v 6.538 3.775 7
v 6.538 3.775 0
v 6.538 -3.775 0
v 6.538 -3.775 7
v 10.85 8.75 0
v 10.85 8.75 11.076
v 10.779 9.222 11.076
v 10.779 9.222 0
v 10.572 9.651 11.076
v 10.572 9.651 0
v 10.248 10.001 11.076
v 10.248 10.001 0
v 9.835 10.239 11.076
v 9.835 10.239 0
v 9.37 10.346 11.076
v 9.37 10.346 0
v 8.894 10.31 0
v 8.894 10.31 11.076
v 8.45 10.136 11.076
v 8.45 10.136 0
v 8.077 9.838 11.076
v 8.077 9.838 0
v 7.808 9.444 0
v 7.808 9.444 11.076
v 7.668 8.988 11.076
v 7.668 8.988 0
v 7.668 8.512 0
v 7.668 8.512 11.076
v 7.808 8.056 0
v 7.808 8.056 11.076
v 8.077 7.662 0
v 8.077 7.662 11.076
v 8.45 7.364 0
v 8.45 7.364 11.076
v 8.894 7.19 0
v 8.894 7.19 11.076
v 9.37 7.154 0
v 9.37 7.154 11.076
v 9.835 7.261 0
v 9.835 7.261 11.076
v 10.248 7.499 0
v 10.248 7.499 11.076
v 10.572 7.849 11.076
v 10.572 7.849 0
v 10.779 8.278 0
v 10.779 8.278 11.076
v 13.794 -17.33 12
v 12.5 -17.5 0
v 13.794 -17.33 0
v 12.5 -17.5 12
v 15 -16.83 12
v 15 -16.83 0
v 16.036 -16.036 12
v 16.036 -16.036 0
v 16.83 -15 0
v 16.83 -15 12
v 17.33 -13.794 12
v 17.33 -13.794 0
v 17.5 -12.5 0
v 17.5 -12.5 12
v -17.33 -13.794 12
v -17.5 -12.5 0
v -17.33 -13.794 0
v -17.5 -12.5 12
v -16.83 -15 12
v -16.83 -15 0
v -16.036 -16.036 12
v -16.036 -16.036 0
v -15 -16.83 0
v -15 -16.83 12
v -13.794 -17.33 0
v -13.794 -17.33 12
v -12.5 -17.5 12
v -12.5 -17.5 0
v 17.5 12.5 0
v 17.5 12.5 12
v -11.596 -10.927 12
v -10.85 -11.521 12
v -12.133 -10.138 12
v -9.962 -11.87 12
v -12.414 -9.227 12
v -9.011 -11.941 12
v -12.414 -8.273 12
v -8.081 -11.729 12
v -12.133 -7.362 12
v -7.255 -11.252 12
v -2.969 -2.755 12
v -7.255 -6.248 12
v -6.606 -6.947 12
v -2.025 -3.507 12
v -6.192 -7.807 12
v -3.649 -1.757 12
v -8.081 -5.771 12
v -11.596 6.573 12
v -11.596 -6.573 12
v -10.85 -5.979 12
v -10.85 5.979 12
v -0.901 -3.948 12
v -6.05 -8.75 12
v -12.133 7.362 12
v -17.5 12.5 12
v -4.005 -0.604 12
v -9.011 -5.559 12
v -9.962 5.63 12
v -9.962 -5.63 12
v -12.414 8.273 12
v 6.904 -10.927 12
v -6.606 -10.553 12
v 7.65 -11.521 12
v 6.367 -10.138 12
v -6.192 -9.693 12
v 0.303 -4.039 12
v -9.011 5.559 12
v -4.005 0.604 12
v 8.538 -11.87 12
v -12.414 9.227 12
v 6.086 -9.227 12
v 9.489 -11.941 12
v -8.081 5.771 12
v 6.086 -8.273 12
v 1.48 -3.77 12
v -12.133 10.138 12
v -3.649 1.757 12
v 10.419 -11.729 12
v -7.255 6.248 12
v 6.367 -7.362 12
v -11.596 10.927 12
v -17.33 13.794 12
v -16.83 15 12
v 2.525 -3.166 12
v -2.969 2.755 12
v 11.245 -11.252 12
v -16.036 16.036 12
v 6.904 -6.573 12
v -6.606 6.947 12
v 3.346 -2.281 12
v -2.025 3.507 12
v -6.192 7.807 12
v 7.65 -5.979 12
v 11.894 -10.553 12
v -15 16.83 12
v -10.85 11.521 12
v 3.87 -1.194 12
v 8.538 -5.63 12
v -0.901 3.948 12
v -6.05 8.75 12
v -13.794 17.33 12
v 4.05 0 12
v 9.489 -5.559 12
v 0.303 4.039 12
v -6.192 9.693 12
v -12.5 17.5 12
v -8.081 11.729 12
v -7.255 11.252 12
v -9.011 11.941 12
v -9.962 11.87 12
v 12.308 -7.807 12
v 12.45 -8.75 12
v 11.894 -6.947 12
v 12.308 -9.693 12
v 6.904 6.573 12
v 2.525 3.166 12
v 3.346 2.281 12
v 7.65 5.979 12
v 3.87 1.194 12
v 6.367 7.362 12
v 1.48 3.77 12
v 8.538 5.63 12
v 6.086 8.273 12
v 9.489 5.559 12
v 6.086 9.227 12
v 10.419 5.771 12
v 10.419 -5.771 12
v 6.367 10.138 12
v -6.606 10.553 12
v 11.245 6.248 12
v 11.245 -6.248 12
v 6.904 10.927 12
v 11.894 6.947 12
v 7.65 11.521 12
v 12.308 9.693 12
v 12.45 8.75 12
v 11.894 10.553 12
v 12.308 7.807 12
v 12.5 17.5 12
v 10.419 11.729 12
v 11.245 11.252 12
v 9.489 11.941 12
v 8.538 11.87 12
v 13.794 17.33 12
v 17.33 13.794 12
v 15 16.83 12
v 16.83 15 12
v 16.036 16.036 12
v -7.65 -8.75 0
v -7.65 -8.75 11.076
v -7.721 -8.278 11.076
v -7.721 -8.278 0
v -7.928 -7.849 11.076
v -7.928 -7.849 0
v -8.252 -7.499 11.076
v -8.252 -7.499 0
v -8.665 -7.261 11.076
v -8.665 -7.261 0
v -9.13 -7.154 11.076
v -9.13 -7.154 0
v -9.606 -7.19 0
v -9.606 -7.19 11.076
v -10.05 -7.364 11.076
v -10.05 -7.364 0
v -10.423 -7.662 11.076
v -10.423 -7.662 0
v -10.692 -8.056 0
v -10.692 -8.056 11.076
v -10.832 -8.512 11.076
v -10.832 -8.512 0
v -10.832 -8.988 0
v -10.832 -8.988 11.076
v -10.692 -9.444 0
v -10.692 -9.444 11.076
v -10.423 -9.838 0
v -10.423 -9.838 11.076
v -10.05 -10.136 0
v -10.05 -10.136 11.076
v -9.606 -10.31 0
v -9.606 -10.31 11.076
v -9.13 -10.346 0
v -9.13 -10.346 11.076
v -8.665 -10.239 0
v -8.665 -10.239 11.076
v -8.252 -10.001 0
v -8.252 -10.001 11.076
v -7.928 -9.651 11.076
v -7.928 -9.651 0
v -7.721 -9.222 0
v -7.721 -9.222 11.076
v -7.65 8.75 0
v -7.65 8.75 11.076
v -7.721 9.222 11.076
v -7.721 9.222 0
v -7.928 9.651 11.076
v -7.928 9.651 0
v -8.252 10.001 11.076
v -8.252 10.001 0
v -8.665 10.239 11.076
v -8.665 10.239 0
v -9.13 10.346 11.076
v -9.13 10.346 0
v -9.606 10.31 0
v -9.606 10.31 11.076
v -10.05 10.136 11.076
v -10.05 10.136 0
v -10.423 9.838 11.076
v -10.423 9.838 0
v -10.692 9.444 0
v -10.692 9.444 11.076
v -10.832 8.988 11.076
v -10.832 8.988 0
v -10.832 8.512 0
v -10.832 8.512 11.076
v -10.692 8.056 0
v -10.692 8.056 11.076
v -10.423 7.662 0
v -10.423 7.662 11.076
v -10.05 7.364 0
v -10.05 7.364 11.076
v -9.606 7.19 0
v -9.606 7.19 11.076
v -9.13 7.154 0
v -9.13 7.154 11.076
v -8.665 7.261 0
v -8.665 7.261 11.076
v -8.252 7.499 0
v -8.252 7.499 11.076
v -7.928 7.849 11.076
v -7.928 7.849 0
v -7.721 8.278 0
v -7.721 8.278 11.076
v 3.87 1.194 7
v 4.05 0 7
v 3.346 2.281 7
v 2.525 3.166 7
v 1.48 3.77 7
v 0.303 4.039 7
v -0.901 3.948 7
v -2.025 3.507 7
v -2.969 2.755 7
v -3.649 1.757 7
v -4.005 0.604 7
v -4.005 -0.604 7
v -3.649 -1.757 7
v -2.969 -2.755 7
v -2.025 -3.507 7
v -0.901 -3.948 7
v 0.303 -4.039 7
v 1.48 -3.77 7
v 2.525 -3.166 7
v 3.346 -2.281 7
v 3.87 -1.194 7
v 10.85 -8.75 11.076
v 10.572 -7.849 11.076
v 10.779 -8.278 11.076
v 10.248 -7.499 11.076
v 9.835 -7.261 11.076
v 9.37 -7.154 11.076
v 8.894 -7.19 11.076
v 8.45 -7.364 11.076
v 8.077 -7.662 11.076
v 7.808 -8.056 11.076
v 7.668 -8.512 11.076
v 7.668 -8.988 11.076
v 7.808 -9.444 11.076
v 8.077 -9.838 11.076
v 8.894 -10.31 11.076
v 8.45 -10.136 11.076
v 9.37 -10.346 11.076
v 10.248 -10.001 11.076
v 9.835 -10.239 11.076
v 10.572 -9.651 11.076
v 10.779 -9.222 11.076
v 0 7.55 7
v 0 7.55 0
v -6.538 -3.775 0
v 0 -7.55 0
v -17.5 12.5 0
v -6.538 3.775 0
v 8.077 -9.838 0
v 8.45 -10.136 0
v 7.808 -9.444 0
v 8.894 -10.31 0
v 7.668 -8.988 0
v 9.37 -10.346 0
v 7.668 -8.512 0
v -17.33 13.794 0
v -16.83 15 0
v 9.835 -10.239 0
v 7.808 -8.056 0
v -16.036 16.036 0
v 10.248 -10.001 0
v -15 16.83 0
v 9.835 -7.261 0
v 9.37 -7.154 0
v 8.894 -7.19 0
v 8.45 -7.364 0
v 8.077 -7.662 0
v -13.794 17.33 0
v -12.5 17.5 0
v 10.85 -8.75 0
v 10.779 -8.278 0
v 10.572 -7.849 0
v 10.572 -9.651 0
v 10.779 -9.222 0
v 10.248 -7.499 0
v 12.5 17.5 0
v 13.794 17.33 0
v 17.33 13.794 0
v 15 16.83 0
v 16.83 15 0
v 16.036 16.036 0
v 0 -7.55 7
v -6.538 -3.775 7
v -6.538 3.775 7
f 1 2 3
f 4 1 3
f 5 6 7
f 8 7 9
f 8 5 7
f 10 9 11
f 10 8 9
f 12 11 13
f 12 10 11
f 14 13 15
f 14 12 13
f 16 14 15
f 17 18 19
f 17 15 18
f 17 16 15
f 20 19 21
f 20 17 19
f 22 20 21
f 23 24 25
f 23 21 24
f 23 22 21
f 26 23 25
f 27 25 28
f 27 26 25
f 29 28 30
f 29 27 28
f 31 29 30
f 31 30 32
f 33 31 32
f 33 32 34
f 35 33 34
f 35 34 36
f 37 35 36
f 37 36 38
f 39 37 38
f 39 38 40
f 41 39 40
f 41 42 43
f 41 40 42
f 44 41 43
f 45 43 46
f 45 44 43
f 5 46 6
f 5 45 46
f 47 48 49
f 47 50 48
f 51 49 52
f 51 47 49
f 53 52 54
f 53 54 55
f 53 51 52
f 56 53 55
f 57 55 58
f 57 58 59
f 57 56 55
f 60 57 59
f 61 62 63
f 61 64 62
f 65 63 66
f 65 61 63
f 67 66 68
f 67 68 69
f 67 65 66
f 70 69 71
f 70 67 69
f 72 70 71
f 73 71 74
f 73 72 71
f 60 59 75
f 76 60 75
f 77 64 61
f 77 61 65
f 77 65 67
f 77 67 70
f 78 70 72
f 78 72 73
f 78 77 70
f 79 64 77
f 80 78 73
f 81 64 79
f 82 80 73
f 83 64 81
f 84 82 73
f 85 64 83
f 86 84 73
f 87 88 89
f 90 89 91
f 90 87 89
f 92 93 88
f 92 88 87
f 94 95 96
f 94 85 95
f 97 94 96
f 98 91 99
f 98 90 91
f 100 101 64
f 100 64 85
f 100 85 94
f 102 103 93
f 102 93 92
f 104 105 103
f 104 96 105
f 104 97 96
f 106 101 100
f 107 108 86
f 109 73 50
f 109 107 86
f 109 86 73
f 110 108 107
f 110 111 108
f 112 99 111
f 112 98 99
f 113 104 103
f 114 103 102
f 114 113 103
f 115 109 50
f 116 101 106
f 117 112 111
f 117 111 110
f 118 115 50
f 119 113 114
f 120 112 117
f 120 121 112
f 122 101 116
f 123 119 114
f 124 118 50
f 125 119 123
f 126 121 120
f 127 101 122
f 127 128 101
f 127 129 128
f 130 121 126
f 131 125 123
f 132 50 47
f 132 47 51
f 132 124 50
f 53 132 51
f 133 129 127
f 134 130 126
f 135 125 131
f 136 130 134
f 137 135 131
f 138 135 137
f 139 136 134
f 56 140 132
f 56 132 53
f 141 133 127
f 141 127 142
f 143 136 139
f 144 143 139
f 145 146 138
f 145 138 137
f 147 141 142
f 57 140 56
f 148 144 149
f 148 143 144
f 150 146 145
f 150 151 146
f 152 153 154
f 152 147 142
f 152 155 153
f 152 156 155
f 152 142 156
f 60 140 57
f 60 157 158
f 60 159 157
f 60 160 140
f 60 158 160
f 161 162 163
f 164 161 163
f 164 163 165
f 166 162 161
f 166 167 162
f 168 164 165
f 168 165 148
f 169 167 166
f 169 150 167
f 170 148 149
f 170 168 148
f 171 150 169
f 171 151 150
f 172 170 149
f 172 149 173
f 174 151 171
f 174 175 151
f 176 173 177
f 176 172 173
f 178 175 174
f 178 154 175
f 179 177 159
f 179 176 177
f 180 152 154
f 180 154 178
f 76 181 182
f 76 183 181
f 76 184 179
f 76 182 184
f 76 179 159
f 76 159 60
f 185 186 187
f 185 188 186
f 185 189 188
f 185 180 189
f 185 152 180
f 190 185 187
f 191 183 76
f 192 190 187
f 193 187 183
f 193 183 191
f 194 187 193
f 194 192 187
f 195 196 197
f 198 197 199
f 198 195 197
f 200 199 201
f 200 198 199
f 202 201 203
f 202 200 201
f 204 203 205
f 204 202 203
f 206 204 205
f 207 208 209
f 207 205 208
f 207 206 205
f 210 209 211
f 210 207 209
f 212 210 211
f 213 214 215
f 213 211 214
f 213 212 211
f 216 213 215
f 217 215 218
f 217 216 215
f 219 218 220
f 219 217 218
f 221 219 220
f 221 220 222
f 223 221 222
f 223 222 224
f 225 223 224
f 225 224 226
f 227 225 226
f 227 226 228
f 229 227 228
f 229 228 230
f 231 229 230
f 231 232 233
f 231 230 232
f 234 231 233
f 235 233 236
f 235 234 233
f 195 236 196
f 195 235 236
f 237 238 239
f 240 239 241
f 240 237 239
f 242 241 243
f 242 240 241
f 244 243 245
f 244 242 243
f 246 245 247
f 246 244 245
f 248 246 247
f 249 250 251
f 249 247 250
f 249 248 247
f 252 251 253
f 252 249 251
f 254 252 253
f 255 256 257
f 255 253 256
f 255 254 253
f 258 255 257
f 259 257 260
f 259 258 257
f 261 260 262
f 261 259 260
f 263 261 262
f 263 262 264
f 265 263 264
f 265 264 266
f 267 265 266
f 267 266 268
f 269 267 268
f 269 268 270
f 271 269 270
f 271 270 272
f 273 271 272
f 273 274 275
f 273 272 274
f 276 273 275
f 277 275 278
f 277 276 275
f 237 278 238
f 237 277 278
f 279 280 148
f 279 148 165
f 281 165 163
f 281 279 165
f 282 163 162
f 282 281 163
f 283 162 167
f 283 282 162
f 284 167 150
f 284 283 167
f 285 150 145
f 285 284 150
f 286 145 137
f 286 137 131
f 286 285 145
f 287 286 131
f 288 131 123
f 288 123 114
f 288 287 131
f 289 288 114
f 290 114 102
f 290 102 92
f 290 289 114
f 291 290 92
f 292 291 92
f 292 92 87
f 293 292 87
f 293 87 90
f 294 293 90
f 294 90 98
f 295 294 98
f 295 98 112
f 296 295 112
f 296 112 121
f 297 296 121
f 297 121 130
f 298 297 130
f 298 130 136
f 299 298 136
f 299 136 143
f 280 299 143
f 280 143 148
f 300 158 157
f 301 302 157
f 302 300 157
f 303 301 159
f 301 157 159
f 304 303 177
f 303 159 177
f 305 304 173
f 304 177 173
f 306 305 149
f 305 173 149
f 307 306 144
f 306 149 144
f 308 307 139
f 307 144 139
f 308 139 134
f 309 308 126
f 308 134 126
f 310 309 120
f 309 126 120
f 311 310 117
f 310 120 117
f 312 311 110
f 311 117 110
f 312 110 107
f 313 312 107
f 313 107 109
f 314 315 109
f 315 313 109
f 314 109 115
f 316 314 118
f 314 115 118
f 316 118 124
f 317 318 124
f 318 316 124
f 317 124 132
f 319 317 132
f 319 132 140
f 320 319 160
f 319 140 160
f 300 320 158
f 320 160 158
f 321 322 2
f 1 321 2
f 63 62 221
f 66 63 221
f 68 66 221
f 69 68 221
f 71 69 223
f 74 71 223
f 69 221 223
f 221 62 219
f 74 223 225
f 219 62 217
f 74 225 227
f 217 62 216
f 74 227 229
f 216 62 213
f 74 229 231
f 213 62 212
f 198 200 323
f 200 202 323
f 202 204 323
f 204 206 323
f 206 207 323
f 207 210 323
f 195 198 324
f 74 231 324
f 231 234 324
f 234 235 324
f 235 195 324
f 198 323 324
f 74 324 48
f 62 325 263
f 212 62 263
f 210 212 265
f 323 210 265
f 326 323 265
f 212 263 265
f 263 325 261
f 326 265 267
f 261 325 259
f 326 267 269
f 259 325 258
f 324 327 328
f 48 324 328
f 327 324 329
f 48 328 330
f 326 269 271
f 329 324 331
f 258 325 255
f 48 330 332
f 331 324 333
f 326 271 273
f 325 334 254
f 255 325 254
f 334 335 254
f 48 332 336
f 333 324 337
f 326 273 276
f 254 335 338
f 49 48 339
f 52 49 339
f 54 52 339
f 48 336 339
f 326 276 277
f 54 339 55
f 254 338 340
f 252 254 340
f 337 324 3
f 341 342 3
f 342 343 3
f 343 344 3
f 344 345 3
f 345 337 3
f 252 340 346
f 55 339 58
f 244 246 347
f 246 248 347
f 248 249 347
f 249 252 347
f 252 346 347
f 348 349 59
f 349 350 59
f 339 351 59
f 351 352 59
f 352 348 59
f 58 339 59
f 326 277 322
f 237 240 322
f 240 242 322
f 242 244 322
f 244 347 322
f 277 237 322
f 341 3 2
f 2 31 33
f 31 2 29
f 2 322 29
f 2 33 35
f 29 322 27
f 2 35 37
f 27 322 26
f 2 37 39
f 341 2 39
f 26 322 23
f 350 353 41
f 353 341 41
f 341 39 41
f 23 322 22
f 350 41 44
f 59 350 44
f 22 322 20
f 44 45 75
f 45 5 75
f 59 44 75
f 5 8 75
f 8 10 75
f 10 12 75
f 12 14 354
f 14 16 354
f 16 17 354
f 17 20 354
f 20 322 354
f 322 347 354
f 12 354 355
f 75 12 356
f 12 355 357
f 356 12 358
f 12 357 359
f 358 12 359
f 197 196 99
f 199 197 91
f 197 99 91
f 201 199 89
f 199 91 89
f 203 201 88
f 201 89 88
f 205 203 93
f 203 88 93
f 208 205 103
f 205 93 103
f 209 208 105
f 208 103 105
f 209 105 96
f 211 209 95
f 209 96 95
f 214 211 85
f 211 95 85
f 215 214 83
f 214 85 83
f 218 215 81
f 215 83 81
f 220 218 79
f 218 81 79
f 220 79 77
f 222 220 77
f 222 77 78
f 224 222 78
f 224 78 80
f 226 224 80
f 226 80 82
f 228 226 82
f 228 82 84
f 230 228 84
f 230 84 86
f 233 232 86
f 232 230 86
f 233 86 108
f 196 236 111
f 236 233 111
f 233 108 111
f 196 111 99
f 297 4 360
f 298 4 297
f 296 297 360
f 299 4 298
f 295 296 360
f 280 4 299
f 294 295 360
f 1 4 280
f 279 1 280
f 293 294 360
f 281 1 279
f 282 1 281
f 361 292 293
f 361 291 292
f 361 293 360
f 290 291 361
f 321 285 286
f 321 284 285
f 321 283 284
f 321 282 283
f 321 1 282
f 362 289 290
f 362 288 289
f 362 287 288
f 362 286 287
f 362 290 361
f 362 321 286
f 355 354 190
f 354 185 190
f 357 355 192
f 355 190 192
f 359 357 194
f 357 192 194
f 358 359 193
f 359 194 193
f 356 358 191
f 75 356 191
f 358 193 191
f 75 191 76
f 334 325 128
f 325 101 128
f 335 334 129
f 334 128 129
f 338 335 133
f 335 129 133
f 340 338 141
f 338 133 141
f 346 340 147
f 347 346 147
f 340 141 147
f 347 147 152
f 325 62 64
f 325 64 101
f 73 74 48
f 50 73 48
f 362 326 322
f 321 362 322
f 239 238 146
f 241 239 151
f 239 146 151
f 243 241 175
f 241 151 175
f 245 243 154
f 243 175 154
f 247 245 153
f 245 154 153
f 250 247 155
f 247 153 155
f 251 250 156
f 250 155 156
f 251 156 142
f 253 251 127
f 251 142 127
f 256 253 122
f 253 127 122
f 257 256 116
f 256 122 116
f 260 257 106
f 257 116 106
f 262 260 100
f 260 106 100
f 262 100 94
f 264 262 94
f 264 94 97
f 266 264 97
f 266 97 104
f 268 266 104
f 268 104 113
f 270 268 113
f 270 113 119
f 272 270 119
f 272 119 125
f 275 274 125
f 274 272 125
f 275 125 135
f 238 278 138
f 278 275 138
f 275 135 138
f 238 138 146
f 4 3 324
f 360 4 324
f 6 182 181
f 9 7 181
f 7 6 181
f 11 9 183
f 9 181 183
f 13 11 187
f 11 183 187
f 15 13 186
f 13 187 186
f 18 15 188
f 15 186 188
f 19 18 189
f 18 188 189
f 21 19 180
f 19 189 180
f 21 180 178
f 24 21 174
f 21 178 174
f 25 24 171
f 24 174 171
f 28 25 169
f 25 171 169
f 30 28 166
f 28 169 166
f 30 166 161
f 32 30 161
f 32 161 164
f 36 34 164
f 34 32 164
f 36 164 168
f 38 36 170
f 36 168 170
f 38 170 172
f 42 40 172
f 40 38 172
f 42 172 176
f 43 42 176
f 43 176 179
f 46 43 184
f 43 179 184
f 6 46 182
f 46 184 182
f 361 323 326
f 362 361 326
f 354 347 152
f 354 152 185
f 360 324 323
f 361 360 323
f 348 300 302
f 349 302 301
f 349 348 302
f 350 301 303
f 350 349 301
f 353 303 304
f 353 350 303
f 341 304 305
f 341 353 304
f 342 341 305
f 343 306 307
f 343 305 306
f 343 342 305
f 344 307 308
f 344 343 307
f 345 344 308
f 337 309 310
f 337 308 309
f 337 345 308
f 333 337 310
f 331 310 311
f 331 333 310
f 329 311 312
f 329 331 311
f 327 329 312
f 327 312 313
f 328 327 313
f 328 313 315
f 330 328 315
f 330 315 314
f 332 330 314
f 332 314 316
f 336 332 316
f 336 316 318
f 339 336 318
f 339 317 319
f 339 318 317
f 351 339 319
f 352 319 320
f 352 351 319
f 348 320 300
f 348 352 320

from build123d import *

# Parameters (mm, degrees)
SKETCH1_W                    = 35
SKETCH1_H                    = 35
SKETCH1_R                    = 4.05
SKETCH1_R_2                  = 1.6
BOSS_EXTRUDE1_DEPTH          = 12
FILLET1_R                    = 5
SKETCH5_R                    = 3.2
CUT_EXTRUDE1_DEPTH           = 1
CUT_EXTRUDE1_DRAFT           = -60
CUT_EXTRUDE1_PROFILE_2_DEPTH = 1
CUT_EXTRUDE1_PROFILE_2_DRAFT = -60
CUT_EXTRUDE1_PROFILE_3_DEPTH = 1
CUT_EXTRUDE1_PROFILE_3_DRAFT = -60
CUT_EXTRUDE1_PROFILE_4_DEPTH = 1
CUT_EXTRUDE1_PROFILE_4_DRAFT = -60
CUT_EXTRUDE2_DEPTH           = 7


with BuildPart() as part:
    # Sketch1 → Boss-Extrude1 (new body)
    with BuildSketch(Plane.XY):
        Rectangle(SKETCH1_W, SKETCH1_H)
        Circle(SKETCH1_R, mode=Mode.SUBTRACT)
        with Locations((-9.25, 8.75)):
            Circle(SKETCH1_R_2, mode=Mode.SUBTRACT)
        with Locations((9.25, 8.75)):
            Circle(SKETCH1_R_2, mode=Mode.SUBTRACT)
        with Locations((-9.25, -8.75)):
            Circle(SKETCH1_R_2, mode=Mode.SUBTRACT)
        with Locations((9.25, -8.75)):
            Circle(SKETCH1_R_2, mode=Mode.SUBTRACT)
    extrude(amount=BOSS_EXTRUDE1_DEPTH)

    # Fillet1
    fillet1_edges = [part.edges().sort_by_distance(p)[0] for p in [
        (-17.5, -17.5, 6),
        (-17.5, 17.5, 6),
        (17.5, 17.5, 6),
        (17.5, -17.5, 6),
    ]]
    fillet(fillet1_edges, radius=FILLET1_R)


with BuildPart() as cut_extrude1_tool:
    # Sketch5 → Cut-Extrude1 (with draft: the straight prism first)
    with BuildSketch(Plane.XY.offset(12)):
        with Locations((-9.25, 8.75)):
            Circle(SKETCH5_R)
    extrude(amount=-CUT_EXTRUDE1_DEPTH)
    # Cut-Extrude1: the draft: its side faces are tilted about the plane it starts from
    cut_extrude1_sides = [cut_extrude1_tool.faces().sort_by_distance(p)[0] for p in [
        (-12.45, 8.75, 11.5),
    ]]
    draft(cut_extrude1_sides, Plane.XY.offset(12), CUT_EXTRUDE1_DRAFT)


with BuildPart() as part_1:
    add(part.part)

    # Cut-Extrude1: cut by cut_extrude1_tool
    add(cut_extrude1_tool.part, mode=Mode.SUBTRACT)


with BuildPart() as cut_extrude1_profile_2_tool:
    # Sketch5 → Cut-Extrude1 profile 2 (with draft: the straight prism first)
    with BuildSketch(Plane.XY.offset(12)):
        with Locations((9.25, 8.75)):
            Circle(SKETCH5_R)
    extrude(amount=-CUT_EXTRUDE1_PROFILE_2_DEPTH)
    # Cut-Extrude1 profile 2: the draft: its side faces are tilted about the plane it starts from
    cut_extrude1_profile_2_sides = [cut_extrude1_profile_2_tool.faces().sort_by_distance(p)[0] for p in [
        (6.05, 8.75, 11.5),
    ]]
    draft(cut_extrude1_profile_2_sides, Plane.XY.offset(12), CUT_EXTRUDE1_PROFILE_2_DRAFT)


with BuildPart() as part_2:
    add(part_1.part)

    # Cut-Extrude1 profile 2: cut by cut_extrude1_profile_2_tool
    add(cut_extrude1_profile_2_tool.part, mode=Mode.SUBTRACT)


with BuildPart() as cut_extrude1_profile_3_tool:
    # Sketch5 → Cut-Extrude1 profile 3 (with draft: the straight prism first)
    with BuildSketch(Plane.XY.offset(12)):
        with Locations((-9.25, -8.75)):
            Circle(SKETCH5_R)
    extrude(amount=-CUT_EXTRUDE1_PROFILE_3_DEPTH)
    # Cut-Extrude1 profile 3: the draft: its side faces are tilted about the plane it starts from
    cut_extrude1_profile_3_sides = [cut_extrude1_profile_3_tool.faces().sort_by_distance(p)[0] for p in [
        (-12.45, -8.75, 11.5),
    ]]
    draft(cut_extrude1_profile_3_sides, Plane.XY.offset(12), CUT_EXTRUDE1_PROFILE_3_DRAFT)


with BuildPart() as part_3:
    add(part_2.part)

    # Cut-Extrude1 profile 3: cut by cut_extrude1_profile_3_tool
    add(cut_extrude1_profile_3_tool.part, mode=Mode.SUBTRACT)


with BuildPart() as cut_extrude1_profile_4_tool:
    # Sketch5 → Cut-Extrude1 profile 4 (with draft: the straight prism first)
    with BuildSketch(Plane.XY.offset(12)):
        with Locations((9.25, -8.75)):
            Circle(SKETCH5_R)
    extrude(amount=-CUT_EXTRUDE1_PROFILE_4_DEPTH)
    # Cut-Extrude1 profile 4: the draft: its side faces are tilted about the plane it starts from
    cut_extrude1_profile_4_sides = [cut_extrude1_profile_4_tool.faces().sort_by_distance(p)[0] for p in [
        (6.05, -8.75, 11.5),
    ]]
    draft(cut_extrude1_profile_4_sides, Plane.XY.offset(12), CUT_EXTRUDE1_PROFILE_4_DRAFT)


with BuildPart() as part_4:
    add(part_3.part)

    # Cut-Extrude1 profile 4: cut by cut_extrude1_profile_4_tool
    add(cut_extrude1_profile_4_tool.part, mode=Mode.SUBTRACT)

    # Sketch6 → Cut-Extrude2 (cut)
    with BuildSketch(Plane(origin=(0, 0, 0), x_dir=(-1, 0, 0), z_dir=(0, 0, -1))):
        Polygon((6.538491799, 3.775), (0, 7.55), (-6.538491799, 3.775), (-6.538491799, -3.775), (0, -7.55), (6.538491799, -3.775), align=None)
    extrude(amount=-CUT_EXTRUDE2_DEPTH, mode=Mode.SUBTRACT)


solid = part_4.part
